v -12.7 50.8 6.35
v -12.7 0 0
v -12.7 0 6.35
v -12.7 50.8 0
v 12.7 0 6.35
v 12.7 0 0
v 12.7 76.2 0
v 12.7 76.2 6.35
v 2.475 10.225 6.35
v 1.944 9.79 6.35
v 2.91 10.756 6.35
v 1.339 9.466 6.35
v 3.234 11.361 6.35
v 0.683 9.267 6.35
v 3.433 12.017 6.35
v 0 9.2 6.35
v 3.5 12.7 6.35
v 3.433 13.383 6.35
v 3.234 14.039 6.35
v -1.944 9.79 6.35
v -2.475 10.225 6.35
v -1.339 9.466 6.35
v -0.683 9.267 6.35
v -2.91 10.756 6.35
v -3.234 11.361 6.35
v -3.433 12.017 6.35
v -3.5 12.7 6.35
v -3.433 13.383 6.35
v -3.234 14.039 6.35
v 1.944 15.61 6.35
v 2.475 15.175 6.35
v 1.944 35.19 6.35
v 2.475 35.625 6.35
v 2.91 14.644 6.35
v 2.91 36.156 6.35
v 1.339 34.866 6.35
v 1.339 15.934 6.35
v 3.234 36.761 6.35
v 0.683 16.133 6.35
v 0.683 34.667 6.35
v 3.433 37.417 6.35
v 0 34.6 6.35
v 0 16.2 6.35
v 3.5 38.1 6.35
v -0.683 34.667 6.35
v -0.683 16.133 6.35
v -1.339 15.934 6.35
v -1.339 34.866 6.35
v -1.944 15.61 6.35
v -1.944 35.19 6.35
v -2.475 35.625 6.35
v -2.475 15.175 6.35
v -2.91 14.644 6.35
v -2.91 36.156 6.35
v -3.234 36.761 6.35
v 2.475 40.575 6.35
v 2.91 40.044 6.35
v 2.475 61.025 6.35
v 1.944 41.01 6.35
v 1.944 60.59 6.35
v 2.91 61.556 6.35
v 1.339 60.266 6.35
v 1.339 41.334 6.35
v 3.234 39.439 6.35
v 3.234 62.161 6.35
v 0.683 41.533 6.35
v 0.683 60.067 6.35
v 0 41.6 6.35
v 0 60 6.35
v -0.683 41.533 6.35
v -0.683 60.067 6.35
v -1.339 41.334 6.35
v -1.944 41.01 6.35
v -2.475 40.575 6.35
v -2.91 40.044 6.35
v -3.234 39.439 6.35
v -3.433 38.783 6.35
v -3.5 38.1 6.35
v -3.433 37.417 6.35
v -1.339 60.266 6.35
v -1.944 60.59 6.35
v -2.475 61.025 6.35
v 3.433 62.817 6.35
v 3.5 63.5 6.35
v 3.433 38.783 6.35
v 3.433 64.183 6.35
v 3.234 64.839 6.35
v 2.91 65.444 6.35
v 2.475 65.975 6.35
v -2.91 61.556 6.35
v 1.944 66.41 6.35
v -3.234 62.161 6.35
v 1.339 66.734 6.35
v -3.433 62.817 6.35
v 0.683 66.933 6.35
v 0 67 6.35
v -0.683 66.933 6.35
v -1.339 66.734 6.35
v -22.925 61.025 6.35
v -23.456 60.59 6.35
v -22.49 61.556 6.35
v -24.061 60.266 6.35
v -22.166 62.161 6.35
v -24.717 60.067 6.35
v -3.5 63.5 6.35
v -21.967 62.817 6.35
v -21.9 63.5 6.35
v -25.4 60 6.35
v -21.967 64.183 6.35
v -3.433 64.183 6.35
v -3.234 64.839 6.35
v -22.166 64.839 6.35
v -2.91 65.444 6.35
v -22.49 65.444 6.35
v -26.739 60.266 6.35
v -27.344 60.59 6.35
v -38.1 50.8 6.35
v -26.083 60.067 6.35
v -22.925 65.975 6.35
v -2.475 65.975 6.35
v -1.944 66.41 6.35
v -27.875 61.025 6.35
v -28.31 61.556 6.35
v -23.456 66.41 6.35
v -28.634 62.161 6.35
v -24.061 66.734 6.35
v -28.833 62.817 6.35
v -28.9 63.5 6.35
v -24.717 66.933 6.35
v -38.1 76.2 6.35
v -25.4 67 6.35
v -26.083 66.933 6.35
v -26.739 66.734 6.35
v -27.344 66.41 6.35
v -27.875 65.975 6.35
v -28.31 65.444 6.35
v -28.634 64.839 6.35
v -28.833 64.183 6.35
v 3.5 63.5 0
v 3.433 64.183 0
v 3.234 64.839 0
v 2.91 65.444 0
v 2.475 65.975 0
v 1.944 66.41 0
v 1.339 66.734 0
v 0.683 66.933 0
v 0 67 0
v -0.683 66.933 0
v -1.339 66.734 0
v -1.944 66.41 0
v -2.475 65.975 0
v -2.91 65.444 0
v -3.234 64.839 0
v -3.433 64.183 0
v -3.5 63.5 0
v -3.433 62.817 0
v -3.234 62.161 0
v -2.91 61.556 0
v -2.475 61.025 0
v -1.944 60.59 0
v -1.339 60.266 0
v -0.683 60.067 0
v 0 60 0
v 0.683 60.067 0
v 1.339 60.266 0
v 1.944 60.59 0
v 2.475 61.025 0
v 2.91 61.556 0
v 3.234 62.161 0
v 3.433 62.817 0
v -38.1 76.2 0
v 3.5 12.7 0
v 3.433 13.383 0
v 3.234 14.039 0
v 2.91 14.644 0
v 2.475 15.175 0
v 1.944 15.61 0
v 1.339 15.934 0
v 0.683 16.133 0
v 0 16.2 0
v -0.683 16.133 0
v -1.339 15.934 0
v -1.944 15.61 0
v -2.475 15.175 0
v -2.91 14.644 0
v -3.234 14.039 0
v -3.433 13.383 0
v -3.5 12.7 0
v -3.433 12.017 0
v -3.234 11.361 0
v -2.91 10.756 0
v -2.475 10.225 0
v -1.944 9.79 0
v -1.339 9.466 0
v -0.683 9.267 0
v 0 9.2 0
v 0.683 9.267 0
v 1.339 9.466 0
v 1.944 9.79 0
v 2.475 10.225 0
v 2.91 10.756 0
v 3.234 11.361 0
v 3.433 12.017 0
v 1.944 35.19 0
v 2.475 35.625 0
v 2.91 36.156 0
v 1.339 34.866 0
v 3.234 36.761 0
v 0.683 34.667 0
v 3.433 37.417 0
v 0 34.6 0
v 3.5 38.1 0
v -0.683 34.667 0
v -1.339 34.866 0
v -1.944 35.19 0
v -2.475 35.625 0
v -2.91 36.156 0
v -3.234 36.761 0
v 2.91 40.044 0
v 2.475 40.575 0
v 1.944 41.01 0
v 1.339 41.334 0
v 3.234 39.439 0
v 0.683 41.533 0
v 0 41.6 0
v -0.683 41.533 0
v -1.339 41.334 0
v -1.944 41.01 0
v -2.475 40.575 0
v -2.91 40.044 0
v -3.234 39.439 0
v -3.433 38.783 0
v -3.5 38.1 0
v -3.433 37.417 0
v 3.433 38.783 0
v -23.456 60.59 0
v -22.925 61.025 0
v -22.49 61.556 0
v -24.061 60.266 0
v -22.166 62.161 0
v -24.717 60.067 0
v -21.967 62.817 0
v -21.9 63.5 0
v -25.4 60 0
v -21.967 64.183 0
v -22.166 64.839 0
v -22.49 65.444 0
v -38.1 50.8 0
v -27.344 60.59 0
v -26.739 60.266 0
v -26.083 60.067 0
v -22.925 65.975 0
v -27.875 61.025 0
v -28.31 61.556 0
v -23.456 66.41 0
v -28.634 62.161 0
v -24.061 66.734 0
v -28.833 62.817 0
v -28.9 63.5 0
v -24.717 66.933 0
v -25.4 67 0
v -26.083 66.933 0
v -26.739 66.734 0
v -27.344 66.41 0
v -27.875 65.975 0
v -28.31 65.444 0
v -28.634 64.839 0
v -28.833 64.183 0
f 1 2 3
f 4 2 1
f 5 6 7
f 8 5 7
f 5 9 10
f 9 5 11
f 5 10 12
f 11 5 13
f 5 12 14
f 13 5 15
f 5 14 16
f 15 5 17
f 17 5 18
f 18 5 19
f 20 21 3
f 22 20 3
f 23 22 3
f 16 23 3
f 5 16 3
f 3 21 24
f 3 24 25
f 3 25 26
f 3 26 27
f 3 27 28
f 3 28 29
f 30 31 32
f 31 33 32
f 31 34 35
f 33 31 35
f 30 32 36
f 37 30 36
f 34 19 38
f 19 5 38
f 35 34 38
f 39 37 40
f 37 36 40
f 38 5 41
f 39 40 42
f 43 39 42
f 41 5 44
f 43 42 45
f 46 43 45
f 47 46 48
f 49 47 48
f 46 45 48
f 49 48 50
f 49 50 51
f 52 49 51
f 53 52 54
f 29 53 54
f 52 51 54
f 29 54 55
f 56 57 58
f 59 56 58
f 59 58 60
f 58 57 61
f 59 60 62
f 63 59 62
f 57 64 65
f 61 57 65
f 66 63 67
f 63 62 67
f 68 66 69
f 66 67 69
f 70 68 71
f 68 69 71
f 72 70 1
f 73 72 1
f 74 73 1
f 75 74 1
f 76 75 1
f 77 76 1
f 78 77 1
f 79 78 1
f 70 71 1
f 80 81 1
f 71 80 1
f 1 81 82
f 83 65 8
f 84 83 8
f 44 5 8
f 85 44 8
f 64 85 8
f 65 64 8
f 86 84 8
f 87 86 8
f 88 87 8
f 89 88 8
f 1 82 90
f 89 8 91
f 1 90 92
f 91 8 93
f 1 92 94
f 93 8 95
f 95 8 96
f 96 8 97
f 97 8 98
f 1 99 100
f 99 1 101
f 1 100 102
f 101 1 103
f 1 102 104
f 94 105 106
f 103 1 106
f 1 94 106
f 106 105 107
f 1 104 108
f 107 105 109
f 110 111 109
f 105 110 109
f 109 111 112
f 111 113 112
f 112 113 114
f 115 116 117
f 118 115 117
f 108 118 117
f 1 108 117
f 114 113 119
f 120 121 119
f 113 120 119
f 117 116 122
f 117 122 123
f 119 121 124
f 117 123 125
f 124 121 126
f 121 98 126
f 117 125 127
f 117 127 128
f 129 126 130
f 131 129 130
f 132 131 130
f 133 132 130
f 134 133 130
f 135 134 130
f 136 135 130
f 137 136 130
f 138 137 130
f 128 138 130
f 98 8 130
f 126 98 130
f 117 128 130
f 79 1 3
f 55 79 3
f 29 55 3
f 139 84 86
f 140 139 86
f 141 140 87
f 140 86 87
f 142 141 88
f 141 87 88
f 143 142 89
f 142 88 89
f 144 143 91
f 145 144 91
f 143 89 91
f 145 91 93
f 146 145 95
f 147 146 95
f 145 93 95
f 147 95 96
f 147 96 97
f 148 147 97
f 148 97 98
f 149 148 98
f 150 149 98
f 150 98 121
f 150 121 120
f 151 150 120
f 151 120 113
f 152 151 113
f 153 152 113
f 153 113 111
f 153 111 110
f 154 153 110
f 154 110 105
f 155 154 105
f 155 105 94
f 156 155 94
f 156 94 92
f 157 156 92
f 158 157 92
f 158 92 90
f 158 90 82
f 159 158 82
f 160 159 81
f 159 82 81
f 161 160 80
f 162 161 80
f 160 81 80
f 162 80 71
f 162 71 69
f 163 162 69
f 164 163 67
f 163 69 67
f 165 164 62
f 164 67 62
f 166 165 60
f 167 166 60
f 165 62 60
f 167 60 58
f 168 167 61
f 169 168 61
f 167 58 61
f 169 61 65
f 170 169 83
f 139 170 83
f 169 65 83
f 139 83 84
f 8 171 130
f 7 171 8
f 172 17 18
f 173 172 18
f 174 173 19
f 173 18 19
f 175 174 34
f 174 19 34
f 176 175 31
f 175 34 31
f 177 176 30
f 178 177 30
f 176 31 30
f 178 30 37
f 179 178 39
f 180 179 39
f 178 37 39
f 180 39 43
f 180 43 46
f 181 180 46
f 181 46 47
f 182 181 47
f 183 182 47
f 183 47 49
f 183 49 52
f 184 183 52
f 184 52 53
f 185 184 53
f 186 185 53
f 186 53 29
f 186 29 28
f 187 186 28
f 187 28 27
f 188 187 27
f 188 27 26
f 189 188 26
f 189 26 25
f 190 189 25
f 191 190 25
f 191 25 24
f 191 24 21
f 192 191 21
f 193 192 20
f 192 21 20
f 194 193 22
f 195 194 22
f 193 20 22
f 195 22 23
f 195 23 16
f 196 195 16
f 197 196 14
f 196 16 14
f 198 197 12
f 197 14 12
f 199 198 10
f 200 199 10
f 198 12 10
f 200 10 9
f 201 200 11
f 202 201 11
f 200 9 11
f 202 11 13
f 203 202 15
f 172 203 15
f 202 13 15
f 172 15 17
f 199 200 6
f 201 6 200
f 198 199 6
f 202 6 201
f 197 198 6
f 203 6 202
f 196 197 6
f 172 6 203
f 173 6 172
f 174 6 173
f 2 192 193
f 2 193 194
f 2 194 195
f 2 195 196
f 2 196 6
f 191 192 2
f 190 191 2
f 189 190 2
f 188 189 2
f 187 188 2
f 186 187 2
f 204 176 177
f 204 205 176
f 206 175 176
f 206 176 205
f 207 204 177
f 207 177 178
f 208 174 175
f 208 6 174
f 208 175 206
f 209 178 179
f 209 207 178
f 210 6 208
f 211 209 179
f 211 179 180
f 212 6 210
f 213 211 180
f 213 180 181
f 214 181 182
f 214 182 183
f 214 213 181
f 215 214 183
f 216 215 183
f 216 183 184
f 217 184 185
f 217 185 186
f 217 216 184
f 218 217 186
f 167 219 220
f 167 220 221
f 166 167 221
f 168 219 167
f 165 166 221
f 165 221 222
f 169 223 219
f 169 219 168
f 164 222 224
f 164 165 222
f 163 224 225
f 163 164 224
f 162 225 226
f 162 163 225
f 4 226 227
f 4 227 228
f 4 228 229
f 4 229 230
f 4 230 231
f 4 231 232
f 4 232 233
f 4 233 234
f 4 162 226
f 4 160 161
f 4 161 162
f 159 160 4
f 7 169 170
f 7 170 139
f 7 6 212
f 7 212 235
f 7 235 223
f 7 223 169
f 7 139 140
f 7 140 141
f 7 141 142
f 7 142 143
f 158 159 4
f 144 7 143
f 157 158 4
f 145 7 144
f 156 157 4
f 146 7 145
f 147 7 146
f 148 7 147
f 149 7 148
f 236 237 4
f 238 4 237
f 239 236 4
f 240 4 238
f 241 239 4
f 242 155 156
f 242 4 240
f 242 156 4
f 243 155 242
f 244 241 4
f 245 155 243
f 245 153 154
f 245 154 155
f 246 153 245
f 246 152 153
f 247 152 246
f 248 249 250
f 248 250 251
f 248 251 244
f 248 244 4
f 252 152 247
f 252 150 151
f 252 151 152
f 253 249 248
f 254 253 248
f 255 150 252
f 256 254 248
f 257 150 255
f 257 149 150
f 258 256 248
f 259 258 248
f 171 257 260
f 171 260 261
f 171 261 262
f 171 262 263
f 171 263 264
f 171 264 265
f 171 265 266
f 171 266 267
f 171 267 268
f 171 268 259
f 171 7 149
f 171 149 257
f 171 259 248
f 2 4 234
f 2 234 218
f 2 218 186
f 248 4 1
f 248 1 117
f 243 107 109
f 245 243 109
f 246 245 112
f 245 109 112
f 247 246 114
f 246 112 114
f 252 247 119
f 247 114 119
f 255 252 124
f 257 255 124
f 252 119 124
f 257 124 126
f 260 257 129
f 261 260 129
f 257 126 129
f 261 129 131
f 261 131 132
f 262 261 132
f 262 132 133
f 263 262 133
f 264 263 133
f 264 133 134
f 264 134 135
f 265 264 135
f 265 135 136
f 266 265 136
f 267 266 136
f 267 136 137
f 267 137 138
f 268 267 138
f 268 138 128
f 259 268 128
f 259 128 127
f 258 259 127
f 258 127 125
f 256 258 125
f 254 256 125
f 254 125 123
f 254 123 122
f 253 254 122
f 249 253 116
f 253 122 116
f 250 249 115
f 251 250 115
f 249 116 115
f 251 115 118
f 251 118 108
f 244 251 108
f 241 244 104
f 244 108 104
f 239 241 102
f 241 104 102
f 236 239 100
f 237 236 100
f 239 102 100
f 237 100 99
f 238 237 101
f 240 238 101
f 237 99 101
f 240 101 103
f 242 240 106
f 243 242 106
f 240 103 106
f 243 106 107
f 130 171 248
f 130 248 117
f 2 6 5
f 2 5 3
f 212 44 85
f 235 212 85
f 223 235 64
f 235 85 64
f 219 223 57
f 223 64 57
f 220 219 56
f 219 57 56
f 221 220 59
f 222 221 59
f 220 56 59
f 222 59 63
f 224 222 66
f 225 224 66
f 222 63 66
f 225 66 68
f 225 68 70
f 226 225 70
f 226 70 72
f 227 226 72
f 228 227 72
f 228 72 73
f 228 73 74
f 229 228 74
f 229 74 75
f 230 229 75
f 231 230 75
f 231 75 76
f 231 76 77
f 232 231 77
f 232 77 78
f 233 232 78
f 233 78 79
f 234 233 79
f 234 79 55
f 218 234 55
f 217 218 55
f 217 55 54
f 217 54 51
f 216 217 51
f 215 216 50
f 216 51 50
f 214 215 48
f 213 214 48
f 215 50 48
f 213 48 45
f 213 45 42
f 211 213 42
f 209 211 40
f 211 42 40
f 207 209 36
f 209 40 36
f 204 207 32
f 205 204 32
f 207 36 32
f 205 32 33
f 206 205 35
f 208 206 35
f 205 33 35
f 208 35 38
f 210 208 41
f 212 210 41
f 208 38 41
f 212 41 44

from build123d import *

# Parameters (mm, degrees)
BOSS_EXTRUDE1_DEPTH = 6.35
SKETCH2_R           = 3.5
CUT_EXTRUDE1_DEPTH  = 7.35
SKETCH3_W           = 14.231578179
SKETCH3_H           = 34.511577086
CUT_EXTRUDE2_DEPTH  = 25


with BuildPart() as part:
    # Sketch1 → Boss-Extrude1 (new body)
    with BuildSketch(Plane.XY):
        Polygon((12.7, 0), (-12.7, 0), (-12.7, 50.8), (-63.1, 50.8), (-63.1, 76.2), (12.7, 76.2), (12.7, 50.8), align=None)
    extrude(amount=BOSS_EXTRUDE1_DEPTH)

    # Sketch2 → Cut-Extrude1 (cut, through all)
    with BuildSketch(Plane.XY.offset(6.35)):
        with Locations((0, 63.5)):
            Circle(SKETCH2_R)
        with Locations((-25.4, 63.5)):
            Circle(SKETCH2_R)
        with Locations((0, 38.1)):
            Circle(SKETCH2_R)
        with Locations((0, 12.7)):
            Circle(SKETCH2_R)
        with Locations((-50.8, 63.5)):
            Circle(SKETCH2_R)
    extrude(amount=-CUT_EXTRUDE1_DEPTH, mode=Mode.SUBTRACT)

    # Sketch3 → Cut-Extrude2 (cut)
    with BuildSketch(Plane.ZY.offset(63.1)):
        with Locations((3.571370897, 64.988127963)):
            Rectangle(SKETCH3_W, SKETCH3_H)
    extrude(amount=-CUT_EXTRUDE2_DEPTH, mode=Mode.SUBTRACT)


solid = part.part
